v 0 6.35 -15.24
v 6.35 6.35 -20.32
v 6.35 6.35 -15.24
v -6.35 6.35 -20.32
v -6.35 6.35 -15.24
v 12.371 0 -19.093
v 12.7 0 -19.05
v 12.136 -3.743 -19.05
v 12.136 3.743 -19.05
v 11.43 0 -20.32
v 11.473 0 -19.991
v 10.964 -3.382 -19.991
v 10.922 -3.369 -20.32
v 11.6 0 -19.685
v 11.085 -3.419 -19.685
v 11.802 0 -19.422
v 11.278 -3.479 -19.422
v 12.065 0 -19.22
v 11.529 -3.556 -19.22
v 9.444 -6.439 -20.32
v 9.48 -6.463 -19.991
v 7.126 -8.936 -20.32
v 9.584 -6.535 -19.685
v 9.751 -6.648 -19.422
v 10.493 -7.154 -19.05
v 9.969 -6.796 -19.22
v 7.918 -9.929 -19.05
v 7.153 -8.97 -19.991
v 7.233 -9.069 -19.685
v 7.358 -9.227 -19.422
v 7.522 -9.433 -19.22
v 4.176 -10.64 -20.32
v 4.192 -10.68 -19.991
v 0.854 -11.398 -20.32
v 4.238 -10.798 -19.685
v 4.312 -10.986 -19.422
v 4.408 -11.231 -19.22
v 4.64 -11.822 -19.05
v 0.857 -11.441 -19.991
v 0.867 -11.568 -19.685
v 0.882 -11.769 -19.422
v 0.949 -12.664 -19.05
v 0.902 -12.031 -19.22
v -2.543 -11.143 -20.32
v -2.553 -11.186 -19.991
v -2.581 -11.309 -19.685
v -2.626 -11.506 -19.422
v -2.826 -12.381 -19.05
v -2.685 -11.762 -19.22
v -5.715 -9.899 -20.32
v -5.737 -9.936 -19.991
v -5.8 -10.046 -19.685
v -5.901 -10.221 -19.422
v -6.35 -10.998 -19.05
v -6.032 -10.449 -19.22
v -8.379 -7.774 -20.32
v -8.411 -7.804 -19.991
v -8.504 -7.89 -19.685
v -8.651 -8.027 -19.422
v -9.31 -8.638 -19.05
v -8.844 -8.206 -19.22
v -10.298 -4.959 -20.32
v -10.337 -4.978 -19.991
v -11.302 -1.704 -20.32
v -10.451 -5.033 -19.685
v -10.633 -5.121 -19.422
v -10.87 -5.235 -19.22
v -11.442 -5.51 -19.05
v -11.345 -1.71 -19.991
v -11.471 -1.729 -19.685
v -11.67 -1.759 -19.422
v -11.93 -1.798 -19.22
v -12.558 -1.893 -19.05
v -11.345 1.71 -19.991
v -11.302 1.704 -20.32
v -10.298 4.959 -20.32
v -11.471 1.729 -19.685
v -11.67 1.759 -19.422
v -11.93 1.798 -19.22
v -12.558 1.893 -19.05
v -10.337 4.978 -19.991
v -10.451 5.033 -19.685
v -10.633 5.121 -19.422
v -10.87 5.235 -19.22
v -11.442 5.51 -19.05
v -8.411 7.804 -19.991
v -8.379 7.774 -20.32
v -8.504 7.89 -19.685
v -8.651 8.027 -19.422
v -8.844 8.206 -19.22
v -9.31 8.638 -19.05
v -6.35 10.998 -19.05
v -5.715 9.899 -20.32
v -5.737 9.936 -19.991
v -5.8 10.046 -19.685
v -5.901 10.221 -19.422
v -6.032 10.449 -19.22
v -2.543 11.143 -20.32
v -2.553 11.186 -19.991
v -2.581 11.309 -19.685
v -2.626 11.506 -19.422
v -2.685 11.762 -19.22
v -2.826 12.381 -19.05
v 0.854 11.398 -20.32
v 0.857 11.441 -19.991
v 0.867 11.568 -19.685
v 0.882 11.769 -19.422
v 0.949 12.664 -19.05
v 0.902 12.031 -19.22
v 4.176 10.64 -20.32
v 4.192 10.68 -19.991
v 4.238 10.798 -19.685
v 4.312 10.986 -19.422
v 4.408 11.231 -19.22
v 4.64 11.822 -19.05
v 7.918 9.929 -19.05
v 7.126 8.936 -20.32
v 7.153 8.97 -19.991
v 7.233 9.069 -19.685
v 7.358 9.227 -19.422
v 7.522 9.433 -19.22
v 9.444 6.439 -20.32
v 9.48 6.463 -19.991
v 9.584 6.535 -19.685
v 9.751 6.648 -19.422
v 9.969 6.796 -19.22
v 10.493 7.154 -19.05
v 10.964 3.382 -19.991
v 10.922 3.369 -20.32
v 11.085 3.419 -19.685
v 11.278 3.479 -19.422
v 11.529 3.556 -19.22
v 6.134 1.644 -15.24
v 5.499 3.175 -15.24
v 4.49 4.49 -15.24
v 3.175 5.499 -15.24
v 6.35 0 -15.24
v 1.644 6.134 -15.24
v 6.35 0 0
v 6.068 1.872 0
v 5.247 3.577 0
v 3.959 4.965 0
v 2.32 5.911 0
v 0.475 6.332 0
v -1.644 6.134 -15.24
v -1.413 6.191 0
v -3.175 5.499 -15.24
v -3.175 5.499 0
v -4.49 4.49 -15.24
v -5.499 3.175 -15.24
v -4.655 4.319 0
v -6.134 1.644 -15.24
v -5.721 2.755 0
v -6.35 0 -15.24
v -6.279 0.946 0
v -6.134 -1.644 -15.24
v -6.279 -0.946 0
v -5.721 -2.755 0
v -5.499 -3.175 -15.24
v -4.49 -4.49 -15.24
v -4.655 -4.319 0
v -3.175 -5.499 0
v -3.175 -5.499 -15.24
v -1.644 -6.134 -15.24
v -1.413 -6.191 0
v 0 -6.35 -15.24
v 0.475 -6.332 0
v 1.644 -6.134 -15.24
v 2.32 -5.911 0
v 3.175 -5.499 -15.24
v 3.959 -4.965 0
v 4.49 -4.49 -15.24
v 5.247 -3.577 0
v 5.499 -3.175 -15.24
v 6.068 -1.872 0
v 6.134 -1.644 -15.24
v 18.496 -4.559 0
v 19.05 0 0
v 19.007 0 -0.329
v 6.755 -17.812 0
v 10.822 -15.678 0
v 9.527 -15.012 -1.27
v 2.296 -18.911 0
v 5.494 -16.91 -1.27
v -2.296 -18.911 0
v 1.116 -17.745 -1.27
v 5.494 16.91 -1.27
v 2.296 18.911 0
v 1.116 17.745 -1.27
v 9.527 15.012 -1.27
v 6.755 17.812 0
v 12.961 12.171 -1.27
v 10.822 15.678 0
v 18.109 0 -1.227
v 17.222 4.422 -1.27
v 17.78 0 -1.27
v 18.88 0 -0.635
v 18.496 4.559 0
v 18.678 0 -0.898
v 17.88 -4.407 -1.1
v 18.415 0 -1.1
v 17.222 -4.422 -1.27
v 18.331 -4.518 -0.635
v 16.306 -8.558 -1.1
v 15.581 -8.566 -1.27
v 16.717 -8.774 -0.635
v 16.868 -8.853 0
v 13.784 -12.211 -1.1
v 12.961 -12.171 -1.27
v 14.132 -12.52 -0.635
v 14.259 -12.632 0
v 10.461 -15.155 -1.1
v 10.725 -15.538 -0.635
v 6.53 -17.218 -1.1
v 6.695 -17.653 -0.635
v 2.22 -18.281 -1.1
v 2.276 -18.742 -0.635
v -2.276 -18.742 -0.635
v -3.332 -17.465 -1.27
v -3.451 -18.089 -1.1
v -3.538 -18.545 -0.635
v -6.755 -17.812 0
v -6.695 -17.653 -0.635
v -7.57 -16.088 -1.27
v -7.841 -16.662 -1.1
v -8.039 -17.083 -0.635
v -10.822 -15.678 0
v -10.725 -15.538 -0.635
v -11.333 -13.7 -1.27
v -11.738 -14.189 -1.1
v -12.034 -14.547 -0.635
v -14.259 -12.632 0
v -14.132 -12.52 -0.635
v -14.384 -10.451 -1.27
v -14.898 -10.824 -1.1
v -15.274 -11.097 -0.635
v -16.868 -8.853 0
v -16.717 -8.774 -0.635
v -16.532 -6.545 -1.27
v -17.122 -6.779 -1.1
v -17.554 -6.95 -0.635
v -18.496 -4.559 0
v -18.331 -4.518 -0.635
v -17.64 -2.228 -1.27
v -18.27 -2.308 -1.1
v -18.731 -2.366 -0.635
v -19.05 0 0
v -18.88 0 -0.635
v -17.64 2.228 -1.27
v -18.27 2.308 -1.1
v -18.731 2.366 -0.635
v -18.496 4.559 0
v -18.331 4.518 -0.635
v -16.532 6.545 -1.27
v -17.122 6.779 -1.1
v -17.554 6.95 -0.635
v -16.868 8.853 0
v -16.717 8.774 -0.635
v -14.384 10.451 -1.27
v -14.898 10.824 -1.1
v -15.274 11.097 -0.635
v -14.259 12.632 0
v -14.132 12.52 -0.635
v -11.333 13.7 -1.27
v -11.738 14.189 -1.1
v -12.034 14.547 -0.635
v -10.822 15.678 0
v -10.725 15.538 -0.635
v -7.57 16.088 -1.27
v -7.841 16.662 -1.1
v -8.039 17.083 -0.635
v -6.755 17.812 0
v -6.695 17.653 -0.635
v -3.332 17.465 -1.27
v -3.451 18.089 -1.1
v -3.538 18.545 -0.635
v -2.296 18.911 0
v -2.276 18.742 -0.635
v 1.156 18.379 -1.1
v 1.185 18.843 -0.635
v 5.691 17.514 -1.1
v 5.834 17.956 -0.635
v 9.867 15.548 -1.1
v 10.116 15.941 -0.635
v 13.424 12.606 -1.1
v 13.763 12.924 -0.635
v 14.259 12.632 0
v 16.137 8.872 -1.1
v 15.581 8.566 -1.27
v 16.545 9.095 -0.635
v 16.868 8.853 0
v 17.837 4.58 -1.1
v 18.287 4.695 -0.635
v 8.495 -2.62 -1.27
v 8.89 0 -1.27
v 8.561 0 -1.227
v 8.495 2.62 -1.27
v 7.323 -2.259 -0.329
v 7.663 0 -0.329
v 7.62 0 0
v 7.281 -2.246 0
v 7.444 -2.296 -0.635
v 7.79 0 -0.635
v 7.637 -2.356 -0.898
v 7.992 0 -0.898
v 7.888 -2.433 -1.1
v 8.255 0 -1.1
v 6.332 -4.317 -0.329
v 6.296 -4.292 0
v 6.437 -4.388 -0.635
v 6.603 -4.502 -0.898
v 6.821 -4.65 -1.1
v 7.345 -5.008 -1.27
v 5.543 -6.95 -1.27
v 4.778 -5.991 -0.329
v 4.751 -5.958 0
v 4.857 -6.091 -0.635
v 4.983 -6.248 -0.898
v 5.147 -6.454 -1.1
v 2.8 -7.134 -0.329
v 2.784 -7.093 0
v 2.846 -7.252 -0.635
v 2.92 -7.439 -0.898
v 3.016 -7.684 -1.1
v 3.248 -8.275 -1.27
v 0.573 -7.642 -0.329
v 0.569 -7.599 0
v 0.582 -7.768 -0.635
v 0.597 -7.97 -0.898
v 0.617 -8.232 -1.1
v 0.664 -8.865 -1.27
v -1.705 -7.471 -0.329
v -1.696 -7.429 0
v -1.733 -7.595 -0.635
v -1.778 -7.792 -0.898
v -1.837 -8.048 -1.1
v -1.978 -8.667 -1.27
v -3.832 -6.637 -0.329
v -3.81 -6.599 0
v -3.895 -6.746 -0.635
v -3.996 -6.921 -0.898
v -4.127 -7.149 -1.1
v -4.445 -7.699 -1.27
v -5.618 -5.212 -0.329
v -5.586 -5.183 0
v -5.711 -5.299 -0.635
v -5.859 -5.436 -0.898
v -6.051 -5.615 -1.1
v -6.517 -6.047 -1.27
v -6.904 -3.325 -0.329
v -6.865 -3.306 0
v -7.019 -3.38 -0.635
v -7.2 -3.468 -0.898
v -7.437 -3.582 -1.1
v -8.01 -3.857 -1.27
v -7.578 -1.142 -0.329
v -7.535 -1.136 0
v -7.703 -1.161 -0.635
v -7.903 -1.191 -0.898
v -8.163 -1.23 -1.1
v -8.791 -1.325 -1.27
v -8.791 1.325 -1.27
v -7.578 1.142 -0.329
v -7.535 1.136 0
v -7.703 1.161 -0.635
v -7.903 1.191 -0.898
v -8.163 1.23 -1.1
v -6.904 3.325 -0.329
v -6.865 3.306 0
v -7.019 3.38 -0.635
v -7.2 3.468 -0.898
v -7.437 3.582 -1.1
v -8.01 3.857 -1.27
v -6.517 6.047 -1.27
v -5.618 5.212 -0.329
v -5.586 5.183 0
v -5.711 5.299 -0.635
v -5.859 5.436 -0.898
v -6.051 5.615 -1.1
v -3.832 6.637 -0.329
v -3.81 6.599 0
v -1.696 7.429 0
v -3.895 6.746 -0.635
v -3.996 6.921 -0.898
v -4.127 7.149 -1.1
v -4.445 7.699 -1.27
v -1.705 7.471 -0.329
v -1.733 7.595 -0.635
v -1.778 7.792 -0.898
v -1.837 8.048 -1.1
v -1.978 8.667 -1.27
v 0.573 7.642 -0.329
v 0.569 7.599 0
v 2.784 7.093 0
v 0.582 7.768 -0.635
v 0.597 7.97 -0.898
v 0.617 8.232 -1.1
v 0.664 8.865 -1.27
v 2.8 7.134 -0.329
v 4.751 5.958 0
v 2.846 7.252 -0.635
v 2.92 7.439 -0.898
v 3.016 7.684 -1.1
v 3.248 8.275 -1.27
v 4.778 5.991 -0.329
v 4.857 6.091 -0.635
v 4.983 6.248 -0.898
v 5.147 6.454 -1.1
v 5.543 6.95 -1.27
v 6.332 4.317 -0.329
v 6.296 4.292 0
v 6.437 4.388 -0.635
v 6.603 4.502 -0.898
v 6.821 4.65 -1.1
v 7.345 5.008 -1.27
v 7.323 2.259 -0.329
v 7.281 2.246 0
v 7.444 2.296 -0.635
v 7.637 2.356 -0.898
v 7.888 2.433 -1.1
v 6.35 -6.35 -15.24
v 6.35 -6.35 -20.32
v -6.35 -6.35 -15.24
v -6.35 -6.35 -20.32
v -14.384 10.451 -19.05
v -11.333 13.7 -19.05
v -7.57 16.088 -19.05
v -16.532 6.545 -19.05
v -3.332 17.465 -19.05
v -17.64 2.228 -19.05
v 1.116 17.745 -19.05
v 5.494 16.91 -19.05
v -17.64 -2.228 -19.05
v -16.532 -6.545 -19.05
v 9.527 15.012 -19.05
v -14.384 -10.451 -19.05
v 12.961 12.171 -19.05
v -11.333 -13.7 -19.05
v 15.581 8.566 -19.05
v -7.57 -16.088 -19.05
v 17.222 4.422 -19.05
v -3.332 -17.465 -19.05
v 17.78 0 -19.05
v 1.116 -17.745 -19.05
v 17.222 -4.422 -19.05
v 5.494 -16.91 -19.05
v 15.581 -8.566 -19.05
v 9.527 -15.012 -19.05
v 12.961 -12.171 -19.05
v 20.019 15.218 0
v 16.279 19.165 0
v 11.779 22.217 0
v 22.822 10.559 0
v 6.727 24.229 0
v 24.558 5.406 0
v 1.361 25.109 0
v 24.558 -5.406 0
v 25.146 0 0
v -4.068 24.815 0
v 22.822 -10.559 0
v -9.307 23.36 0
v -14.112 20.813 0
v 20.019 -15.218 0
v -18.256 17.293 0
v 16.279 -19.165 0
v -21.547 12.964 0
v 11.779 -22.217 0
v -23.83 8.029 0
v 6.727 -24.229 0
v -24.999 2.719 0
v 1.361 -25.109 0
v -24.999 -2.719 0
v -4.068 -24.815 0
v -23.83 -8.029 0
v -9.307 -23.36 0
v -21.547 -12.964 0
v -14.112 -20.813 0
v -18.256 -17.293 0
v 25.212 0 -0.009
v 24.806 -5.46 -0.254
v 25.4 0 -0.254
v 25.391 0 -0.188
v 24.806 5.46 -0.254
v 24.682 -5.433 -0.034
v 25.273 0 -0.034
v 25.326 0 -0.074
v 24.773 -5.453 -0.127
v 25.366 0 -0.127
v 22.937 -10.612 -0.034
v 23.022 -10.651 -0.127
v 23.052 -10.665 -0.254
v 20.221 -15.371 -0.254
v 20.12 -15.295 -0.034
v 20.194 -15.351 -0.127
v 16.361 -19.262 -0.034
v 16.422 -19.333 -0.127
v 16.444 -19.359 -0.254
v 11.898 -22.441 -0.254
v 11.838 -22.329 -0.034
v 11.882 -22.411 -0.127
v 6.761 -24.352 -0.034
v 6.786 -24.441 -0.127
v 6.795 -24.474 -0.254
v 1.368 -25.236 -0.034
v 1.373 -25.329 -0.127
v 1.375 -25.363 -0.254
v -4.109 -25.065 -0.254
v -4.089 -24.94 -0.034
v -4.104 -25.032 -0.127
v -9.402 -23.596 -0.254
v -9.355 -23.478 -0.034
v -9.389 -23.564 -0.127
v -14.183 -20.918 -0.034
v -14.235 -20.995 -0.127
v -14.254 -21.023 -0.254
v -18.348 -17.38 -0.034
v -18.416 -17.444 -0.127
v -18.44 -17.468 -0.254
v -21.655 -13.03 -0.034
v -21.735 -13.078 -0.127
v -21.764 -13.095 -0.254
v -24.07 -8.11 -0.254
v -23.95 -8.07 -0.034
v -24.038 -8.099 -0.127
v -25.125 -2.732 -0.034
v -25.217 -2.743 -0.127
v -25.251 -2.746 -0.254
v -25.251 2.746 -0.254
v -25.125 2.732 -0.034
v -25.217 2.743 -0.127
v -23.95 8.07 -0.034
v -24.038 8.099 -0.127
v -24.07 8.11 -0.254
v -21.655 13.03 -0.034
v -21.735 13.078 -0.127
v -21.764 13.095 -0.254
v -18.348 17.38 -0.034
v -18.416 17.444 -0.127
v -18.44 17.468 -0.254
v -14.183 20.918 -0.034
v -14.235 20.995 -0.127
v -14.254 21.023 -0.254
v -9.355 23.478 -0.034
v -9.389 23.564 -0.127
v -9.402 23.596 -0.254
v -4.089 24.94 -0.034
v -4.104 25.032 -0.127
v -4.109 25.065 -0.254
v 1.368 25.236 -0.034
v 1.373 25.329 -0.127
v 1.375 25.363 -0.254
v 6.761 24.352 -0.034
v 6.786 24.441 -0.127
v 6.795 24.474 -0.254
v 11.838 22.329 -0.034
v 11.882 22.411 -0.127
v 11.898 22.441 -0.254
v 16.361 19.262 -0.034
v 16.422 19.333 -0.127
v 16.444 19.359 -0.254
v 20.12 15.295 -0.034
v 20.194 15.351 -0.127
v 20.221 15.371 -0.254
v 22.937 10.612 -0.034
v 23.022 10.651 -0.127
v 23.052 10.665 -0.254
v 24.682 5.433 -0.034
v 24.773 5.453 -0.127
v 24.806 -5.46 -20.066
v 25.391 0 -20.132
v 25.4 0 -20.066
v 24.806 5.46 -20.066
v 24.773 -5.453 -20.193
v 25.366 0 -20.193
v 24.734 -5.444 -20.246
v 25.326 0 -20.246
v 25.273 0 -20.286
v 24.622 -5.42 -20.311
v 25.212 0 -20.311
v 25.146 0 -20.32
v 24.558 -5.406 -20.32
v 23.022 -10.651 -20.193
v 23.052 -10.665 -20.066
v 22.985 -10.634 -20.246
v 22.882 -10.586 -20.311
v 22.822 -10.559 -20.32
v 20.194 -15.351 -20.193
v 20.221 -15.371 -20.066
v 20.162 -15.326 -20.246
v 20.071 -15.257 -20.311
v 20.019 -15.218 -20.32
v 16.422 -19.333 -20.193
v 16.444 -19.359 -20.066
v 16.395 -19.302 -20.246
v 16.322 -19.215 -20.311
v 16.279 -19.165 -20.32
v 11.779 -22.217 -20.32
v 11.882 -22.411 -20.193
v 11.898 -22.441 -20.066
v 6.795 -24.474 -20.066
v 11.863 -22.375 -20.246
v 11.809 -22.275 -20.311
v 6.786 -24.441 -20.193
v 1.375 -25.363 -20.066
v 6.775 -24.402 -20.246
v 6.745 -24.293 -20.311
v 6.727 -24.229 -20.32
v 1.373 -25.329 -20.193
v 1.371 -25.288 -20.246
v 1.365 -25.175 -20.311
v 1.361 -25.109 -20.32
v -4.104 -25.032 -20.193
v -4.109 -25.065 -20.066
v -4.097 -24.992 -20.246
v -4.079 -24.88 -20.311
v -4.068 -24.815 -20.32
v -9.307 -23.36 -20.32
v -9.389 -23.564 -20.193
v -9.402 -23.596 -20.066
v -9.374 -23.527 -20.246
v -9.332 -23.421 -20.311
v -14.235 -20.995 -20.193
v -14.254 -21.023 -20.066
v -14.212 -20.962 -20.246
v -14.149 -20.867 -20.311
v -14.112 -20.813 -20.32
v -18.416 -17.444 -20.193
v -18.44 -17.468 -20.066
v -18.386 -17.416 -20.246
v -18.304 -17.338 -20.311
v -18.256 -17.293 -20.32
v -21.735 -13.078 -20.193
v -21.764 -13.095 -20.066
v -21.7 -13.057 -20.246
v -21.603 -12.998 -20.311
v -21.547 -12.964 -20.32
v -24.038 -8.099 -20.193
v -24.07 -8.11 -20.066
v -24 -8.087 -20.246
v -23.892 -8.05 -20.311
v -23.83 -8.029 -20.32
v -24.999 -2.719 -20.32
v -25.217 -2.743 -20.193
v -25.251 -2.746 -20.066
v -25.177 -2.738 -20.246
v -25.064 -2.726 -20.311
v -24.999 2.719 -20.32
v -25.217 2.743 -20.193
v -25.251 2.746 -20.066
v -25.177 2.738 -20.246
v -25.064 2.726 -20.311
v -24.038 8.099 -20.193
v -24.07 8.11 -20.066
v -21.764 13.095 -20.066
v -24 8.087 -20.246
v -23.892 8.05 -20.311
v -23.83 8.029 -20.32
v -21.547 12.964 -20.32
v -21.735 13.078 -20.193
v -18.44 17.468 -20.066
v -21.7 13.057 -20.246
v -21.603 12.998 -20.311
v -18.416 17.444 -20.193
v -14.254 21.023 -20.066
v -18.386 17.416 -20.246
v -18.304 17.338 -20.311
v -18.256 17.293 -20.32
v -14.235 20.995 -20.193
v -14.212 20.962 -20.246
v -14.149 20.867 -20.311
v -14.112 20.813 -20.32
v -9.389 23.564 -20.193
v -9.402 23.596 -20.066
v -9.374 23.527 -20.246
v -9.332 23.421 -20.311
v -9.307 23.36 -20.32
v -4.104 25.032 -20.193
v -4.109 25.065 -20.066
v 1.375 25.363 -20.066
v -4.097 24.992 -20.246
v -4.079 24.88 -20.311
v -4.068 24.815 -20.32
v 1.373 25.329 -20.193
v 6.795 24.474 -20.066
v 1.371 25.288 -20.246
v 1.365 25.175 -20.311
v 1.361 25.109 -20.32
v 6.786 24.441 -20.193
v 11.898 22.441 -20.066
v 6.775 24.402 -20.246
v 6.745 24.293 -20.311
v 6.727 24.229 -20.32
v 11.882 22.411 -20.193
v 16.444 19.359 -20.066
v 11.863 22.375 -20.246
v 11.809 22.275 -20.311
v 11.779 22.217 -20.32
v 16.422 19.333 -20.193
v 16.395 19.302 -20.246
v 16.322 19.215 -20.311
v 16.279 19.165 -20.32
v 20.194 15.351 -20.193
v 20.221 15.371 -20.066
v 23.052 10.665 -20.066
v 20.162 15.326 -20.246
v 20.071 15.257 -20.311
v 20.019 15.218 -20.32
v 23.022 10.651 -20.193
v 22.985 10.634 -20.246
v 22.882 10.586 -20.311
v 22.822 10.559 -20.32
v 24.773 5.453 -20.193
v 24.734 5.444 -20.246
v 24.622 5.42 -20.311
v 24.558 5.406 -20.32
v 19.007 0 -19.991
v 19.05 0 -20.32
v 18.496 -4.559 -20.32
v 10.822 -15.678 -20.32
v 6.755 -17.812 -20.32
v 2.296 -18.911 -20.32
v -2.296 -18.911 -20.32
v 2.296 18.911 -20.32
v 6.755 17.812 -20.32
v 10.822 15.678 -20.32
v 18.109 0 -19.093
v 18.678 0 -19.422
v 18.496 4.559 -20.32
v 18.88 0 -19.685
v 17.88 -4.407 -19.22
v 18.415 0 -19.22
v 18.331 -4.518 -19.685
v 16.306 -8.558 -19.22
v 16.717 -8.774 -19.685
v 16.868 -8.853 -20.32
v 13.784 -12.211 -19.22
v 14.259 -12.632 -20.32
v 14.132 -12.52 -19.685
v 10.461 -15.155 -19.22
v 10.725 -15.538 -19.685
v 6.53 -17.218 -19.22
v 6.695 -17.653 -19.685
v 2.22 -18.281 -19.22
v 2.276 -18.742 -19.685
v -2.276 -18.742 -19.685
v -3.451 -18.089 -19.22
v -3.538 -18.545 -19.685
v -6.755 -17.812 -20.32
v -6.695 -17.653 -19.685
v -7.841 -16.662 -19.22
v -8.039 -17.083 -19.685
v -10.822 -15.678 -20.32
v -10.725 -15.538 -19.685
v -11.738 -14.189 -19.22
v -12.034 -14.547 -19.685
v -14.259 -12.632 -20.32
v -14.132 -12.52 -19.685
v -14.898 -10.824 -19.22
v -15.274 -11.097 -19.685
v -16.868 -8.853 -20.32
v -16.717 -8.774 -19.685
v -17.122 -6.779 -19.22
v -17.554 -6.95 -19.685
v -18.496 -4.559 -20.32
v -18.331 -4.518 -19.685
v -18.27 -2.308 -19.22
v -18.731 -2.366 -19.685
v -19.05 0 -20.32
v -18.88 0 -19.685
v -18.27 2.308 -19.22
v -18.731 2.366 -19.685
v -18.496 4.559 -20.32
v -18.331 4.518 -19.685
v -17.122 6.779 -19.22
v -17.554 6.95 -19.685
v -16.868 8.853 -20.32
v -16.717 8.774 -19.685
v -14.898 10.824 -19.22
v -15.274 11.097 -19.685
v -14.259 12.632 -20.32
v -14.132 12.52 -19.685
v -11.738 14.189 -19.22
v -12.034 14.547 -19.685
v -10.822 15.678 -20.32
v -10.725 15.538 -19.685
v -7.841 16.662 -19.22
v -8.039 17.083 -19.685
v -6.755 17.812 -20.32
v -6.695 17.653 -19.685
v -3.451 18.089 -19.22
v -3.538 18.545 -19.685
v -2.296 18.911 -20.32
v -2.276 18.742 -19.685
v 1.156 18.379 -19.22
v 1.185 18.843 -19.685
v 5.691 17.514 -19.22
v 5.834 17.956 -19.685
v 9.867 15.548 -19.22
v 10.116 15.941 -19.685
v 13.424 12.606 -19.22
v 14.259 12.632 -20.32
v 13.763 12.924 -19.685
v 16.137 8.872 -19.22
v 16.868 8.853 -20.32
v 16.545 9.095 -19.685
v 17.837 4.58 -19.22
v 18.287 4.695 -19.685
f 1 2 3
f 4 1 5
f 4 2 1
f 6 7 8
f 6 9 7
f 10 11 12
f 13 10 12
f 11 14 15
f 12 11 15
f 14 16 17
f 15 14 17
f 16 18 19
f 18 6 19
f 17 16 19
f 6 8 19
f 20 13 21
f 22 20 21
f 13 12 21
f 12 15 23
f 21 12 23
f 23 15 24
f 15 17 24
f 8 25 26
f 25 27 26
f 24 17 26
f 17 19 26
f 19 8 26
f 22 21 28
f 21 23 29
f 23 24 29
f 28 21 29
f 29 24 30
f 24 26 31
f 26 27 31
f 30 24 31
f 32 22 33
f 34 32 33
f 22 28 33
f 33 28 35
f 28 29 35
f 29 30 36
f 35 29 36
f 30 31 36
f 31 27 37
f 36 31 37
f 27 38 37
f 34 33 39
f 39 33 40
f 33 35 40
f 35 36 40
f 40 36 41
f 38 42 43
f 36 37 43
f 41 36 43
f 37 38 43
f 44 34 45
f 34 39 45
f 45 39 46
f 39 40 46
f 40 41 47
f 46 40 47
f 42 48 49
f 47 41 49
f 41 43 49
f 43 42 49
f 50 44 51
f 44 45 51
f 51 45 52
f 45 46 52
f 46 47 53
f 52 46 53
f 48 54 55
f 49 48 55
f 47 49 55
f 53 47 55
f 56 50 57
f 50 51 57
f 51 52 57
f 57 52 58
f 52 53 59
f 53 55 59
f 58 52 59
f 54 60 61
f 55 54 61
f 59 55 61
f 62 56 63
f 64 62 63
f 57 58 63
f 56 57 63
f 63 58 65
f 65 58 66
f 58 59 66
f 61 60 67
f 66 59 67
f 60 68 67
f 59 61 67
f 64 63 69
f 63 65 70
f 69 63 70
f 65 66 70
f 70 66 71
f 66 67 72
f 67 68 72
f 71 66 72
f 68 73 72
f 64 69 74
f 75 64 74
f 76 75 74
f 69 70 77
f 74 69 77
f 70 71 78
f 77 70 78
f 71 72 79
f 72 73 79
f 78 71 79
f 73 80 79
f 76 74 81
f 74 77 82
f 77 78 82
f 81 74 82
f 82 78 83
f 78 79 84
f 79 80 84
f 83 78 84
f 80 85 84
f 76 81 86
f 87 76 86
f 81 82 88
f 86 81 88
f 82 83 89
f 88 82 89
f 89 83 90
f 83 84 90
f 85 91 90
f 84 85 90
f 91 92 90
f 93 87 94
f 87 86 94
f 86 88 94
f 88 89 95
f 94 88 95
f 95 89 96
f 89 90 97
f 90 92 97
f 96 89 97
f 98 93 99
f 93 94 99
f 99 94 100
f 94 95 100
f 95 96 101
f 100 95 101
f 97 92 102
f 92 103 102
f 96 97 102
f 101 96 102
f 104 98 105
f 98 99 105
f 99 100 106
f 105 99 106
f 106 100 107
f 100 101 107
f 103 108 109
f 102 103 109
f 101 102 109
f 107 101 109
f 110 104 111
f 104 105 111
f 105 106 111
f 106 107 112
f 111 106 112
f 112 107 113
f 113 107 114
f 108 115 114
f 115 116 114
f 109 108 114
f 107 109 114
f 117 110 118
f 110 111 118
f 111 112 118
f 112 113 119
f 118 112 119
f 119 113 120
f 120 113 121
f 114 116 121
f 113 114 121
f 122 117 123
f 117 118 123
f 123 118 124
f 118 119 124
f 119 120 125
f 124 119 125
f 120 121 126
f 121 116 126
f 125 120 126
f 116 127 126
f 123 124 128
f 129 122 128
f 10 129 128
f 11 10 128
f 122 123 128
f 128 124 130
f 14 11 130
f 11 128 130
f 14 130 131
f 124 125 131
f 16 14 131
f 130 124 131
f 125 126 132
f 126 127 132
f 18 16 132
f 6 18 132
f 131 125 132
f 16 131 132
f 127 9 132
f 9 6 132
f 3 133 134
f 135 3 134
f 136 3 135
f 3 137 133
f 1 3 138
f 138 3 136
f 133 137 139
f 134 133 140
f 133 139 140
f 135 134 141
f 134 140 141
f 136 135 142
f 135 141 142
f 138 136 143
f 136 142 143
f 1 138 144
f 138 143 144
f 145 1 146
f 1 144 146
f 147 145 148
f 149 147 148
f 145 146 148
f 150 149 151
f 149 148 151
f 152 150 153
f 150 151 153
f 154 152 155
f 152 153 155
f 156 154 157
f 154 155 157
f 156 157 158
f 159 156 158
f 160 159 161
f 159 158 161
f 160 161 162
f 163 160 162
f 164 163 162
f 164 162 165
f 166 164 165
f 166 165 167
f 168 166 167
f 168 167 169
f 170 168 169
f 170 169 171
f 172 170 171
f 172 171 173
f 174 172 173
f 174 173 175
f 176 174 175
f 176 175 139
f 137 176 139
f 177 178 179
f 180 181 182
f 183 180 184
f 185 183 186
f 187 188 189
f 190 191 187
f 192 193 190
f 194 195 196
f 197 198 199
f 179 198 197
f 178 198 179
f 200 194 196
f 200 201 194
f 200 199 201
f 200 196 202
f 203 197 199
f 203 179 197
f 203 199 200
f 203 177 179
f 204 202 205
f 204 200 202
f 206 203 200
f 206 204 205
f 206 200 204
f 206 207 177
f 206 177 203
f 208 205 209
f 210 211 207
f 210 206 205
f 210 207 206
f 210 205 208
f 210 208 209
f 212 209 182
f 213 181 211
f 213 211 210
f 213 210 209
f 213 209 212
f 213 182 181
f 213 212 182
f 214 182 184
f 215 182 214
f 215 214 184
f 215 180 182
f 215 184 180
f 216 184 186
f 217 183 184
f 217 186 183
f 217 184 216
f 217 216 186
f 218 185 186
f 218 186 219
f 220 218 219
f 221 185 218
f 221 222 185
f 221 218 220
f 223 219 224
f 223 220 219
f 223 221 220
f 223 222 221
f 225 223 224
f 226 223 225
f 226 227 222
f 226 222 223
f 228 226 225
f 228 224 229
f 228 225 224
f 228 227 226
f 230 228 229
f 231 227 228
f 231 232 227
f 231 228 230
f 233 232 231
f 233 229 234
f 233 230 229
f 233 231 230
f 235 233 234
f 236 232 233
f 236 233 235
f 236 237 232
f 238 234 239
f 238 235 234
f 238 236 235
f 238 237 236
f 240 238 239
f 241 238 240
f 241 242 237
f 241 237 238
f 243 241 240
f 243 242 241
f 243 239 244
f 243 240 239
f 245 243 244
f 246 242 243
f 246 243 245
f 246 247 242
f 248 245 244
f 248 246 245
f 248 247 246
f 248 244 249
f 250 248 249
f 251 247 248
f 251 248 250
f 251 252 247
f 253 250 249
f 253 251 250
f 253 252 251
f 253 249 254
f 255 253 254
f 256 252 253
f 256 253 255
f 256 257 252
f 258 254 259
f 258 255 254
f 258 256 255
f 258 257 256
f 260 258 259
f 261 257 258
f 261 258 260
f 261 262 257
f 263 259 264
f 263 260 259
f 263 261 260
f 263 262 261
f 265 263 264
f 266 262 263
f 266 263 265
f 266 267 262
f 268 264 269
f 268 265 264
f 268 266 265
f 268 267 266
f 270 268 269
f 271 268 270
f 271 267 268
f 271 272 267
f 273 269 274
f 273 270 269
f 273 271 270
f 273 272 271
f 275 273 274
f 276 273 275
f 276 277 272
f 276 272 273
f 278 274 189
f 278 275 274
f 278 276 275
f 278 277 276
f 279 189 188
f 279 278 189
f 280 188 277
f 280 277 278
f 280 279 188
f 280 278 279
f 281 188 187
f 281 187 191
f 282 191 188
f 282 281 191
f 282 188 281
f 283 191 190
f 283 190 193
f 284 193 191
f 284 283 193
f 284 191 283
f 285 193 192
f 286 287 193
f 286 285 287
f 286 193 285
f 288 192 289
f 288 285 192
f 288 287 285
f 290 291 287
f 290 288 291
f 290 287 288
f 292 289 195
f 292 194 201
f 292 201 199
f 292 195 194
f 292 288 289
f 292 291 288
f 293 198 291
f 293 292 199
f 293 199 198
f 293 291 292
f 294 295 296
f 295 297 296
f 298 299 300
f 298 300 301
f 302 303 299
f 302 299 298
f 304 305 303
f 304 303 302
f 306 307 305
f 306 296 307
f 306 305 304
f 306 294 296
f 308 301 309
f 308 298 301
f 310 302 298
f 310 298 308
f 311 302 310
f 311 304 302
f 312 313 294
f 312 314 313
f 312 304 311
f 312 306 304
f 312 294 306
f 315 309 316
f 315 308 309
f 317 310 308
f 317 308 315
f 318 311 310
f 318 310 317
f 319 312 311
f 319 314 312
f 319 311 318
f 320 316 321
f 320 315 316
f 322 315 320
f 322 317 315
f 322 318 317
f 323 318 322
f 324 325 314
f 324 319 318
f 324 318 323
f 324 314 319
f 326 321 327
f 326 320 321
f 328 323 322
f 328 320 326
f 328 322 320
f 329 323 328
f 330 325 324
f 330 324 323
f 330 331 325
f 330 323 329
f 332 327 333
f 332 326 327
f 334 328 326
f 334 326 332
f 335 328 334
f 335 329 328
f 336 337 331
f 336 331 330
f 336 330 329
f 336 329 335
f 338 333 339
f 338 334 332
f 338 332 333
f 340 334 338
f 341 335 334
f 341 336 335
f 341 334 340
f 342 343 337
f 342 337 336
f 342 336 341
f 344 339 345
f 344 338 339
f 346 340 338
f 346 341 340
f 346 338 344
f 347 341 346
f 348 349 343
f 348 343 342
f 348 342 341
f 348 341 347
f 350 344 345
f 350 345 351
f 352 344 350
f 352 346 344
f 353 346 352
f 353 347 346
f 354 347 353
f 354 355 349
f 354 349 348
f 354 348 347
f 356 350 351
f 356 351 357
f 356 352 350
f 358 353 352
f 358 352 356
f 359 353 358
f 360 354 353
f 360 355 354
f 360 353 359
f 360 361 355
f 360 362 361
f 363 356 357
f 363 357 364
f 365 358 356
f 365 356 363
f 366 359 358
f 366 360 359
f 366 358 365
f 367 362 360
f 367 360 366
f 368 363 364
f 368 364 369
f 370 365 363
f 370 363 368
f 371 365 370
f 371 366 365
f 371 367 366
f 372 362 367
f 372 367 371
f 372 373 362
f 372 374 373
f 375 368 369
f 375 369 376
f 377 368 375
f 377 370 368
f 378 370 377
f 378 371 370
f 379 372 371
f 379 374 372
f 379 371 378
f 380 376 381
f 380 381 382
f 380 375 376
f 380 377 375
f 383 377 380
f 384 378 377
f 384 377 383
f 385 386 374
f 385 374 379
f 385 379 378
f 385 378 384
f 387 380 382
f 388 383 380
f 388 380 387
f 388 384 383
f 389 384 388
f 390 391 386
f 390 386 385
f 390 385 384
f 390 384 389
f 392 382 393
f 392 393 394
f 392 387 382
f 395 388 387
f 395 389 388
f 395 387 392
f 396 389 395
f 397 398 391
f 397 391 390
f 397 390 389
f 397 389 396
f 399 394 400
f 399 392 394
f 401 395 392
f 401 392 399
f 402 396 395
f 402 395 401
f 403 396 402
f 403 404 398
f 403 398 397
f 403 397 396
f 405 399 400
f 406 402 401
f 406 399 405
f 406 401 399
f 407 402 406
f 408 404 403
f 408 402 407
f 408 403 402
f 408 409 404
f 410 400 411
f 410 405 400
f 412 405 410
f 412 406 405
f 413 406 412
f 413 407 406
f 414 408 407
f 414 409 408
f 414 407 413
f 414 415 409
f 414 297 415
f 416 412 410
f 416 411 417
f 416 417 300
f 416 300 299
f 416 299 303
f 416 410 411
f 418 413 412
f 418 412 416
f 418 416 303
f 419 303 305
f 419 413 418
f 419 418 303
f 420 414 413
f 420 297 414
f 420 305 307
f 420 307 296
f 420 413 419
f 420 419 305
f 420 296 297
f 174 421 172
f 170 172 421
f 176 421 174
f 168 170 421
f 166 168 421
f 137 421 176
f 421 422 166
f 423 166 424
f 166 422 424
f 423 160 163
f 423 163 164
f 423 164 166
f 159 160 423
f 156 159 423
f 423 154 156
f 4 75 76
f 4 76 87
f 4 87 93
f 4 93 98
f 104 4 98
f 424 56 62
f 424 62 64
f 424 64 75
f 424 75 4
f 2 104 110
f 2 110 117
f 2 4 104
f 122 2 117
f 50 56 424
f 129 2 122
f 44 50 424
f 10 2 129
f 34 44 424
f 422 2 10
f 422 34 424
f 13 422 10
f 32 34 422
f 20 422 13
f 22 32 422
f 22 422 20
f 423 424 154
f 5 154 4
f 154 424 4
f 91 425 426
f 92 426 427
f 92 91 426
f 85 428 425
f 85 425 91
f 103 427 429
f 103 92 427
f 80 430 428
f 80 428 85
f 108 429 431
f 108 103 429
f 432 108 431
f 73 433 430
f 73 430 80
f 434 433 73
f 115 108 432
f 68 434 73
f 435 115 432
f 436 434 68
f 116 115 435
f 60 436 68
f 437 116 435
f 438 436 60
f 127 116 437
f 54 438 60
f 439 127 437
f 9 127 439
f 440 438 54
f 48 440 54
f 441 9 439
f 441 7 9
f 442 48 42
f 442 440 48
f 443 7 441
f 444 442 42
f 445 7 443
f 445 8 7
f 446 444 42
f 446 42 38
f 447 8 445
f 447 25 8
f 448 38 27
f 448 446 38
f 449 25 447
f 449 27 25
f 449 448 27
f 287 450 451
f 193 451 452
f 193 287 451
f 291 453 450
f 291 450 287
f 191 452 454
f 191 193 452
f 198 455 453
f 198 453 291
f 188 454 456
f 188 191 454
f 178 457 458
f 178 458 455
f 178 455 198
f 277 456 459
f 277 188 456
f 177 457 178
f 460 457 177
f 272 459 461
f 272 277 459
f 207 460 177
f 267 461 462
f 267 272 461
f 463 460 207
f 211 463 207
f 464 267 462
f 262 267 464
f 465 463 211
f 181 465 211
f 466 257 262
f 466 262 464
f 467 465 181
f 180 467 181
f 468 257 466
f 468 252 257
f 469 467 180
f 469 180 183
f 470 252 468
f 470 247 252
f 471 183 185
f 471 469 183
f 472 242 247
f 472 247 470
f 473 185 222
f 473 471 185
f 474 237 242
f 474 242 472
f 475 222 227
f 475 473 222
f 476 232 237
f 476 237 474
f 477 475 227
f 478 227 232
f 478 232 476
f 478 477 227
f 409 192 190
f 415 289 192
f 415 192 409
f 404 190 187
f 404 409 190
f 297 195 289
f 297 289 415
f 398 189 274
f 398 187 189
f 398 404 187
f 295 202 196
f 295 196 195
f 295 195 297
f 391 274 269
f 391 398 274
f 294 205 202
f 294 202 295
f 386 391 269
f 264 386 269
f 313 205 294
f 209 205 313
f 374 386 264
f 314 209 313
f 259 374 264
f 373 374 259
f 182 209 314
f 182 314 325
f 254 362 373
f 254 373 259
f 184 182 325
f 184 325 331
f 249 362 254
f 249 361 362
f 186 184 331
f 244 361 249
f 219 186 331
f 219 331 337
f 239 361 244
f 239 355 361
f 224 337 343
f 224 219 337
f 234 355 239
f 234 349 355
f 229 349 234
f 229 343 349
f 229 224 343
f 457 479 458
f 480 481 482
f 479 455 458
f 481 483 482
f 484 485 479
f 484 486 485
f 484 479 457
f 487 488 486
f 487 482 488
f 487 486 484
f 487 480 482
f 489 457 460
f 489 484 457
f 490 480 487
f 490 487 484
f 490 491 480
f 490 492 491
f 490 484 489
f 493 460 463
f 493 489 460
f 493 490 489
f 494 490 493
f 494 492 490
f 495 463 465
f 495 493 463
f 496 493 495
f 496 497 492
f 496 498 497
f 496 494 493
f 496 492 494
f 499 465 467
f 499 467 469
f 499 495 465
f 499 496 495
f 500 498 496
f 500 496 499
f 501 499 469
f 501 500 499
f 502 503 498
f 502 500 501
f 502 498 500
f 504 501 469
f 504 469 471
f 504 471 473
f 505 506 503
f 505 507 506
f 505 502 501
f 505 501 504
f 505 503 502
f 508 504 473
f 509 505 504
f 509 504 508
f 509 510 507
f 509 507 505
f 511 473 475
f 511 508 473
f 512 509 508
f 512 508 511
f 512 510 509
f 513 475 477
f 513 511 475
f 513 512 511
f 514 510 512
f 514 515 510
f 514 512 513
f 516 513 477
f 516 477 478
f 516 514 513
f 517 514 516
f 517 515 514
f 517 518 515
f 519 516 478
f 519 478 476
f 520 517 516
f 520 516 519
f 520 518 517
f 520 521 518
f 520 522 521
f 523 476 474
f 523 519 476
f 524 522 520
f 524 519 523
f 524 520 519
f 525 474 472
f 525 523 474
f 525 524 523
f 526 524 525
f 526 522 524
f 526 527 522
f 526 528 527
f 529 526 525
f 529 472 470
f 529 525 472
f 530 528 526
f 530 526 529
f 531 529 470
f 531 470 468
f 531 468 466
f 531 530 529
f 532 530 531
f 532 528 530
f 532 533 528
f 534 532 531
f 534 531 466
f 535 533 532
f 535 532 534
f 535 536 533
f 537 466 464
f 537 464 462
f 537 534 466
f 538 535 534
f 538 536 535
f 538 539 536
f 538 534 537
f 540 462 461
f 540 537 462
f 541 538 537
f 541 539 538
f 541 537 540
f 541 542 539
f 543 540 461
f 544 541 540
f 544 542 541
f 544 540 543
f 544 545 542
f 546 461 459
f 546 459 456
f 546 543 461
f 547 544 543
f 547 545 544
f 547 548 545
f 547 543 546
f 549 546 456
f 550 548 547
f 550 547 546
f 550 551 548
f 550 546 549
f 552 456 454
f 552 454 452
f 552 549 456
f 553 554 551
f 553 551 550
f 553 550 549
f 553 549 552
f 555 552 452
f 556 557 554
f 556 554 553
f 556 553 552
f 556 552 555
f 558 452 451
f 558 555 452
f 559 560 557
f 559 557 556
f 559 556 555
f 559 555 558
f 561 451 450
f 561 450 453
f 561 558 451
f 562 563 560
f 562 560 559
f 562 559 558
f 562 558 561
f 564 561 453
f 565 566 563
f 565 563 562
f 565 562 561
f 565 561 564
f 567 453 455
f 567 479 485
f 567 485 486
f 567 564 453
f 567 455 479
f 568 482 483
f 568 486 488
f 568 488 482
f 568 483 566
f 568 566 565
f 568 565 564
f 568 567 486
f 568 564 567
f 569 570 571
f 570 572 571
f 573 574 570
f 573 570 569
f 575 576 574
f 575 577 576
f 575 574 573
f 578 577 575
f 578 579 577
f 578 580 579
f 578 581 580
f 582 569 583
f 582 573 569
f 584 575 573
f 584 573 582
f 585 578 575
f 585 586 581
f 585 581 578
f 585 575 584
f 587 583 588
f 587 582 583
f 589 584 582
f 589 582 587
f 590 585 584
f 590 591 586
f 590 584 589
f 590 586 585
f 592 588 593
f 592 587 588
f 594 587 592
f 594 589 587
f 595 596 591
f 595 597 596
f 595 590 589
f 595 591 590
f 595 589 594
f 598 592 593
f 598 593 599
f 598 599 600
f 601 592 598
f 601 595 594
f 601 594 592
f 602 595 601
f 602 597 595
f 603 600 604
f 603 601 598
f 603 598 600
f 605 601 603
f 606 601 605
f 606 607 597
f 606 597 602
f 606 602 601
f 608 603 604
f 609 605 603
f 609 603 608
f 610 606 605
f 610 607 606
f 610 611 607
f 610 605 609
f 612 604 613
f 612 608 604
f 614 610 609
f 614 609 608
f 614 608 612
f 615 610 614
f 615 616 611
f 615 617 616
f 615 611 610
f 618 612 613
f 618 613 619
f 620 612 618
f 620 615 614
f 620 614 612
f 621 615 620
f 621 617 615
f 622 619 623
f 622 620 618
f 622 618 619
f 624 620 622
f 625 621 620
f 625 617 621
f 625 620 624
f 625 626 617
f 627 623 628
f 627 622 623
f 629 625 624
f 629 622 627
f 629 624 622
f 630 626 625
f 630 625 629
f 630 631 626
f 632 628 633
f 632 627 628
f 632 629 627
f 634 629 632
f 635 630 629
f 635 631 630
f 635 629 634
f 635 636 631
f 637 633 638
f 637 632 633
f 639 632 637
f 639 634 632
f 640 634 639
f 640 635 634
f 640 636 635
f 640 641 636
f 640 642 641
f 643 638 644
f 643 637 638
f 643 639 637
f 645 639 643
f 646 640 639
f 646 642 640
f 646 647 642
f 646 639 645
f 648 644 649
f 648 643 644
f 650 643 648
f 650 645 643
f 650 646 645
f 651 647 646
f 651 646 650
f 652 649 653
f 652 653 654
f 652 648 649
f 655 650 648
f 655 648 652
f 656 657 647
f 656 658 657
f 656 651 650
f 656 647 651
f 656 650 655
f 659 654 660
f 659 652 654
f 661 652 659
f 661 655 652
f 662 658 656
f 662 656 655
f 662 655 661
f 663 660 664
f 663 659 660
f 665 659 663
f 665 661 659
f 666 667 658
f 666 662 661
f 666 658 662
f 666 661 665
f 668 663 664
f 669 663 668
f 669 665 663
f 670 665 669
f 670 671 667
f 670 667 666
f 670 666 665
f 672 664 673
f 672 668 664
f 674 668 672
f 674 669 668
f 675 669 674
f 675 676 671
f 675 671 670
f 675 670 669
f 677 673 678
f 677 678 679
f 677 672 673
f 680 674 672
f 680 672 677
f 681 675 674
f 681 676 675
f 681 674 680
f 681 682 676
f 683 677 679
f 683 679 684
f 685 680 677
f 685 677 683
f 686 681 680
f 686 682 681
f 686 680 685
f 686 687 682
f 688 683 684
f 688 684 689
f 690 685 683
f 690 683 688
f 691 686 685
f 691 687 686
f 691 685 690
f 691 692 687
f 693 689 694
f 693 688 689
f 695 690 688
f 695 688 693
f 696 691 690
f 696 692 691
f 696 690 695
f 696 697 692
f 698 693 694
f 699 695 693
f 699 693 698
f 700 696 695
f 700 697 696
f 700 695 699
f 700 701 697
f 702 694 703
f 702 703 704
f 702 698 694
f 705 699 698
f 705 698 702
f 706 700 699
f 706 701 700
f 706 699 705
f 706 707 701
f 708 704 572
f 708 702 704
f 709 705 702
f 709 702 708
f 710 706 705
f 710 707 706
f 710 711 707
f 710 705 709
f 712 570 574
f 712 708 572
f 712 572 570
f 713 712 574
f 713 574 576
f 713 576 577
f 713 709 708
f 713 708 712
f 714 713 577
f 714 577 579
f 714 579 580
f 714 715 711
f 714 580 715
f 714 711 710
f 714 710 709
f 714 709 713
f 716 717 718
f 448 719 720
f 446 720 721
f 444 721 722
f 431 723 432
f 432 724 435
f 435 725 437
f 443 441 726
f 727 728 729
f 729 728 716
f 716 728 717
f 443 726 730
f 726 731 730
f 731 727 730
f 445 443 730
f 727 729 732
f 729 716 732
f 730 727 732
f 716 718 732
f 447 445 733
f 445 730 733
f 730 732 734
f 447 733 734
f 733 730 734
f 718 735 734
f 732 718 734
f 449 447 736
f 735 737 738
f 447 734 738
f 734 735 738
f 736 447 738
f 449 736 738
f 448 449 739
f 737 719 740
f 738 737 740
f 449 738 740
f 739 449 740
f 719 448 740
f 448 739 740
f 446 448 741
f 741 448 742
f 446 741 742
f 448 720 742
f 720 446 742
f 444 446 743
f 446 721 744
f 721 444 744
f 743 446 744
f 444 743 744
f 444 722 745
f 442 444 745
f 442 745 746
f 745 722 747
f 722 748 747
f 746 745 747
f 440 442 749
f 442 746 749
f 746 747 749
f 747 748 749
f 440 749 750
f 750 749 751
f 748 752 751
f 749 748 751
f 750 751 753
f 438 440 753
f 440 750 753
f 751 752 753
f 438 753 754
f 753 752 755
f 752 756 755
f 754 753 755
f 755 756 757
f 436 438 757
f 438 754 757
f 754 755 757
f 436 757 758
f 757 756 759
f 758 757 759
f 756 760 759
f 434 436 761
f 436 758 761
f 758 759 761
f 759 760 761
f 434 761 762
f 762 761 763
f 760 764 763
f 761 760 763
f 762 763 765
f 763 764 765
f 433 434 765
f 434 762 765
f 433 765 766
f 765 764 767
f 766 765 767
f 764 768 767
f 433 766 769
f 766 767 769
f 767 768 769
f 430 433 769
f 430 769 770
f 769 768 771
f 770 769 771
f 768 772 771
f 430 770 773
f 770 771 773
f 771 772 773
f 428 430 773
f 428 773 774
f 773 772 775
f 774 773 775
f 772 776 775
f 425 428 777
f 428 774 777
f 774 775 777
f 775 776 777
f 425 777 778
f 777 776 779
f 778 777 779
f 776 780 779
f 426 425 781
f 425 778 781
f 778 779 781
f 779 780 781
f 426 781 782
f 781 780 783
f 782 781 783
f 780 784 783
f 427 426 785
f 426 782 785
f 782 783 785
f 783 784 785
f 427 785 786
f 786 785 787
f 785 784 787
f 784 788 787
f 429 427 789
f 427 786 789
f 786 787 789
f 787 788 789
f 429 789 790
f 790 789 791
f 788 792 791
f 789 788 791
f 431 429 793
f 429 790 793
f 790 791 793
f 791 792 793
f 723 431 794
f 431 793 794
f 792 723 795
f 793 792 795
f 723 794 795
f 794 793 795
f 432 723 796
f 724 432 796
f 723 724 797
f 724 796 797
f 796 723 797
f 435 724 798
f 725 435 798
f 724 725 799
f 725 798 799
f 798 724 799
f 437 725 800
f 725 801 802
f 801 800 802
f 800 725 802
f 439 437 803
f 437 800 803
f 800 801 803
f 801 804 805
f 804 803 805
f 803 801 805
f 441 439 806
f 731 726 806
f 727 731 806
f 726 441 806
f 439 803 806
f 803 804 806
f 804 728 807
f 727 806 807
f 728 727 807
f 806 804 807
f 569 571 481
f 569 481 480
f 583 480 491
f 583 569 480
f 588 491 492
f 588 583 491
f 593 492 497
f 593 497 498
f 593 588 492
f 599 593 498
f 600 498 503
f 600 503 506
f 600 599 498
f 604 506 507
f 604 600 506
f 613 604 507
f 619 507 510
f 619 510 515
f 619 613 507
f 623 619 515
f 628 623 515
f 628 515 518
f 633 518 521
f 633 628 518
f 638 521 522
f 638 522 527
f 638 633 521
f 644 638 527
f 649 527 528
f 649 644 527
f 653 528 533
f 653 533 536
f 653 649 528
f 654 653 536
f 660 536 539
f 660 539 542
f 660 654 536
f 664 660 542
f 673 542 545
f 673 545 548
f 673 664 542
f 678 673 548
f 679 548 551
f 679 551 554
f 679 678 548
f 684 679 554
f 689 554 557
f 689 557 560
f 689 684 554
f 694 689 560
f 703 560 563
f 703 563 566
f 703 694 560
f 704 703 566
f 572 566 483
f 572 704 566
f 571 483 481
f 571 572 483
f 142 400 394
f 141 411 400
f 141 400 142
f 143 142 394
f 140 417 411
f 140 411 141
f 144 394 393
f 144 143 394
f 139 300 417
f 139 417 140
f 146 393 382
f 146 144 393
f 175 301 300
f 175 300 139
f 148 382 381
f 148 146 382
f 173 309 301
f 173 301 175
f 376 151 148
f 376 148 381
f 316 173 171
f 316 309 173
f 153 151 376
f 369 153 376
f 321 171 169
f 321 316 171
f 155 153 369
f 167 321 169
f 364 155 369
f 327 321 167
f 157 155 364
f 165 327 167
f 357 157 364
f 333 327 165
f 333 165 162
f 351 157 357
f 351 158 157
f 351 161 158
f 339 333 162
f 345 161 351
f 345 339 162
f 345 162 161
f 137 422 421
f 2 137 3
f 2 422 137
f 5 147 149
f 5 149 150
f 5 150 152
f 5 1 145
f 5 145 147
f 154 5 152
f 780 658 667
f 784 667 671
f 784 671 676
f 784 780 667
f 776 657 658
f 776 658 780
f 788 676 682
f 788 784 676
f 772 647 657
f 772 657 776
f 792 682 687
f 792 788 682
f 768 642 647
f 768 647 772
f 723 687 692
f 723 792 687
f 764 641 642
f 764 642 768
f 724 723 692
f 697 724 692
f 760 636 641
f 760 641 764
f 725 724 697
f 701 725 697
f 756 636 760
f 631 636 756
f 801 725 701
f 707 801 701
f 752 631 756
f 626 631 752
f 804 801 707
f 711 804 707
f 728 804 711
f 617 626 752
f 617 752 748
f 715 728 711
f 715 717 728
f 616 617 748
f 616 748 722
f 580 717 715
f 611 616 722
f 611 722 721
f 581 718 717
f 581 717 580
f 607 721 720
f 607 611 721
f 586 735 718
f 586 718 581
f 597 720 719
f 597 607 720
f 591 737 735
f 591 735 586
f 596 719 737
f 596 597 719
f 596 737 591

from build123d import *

# Parameters (mm, degrees)
SKETCH3_R          = 6.35
CUT_EXTRUDE1_DEPTH = 42.270115096
FILLET1_R          = 1.27
FILLET2_R          = 0.254
SKETCH4_W          = 12.7
SKETCH4_H          = 12.7
CUT_EXTRUDE2_DEPTH = 5.08


with BuildPart() as part:
    # Sketch2 → Revolve1 (revolve)
    with BuildSketch(Plane(origin=(0, 0, 0), x_dir=(0, 0, -1), z_dir=(1, 0, 0)), mode=Mode.PRIVATE) as revolve1_sk:
        Polygon((0, -7.62), (1.27, -7.62), (1.27, -19.05), (0, -19.05), (0, -25.4), (20.32, -25.4), (20.32, -19.05), (19.05, -19.05), (19.05, -11.43), (20.32, -11.43), (20.32, 0), (0, 0), align=None)
    revolve(revolve1_sk.sketch.rotate(Axis((0, 0, 0), (0, 0, -1)), 270), axis=Axis((0, 0, 0), (0, 0, -1)))

    # Sketch3 → Cut-Extrude1 (cut, through all)
    with BuildSketch(Plane.XY):
        Circle(SKETCH3_R)
    extrude(amount=-CUT_EXTRUDE1_DEPTH, mode=Mode.SUBTRACT)

    # Fillet1
    fillet1_edges = [part.edges().sort_by_distance(p)[0] for p in [
        (-19.05, 0, -19.05),
        (-19.05, 0, -1.27),
        (-7.62, 0, -1.27),
        (-11.43, 0, -19.05),
    ]]
    fillet(fillet1_edges, radius=FILLET1_R - 0.0001)  # a hair under: the kernel refuses the full size

    # Fillet2
    fillet2_edges = [part.edges().sort_by_distance(p)[0] for p in [
        (-25.4, 0, -20.32),
        (-25.4, 0, 0),
    ]]
    fillet(fillet2_edges, radius=FILLET2_R)

    # Sketch4 → Cut-Extrude2 (cut)
    with BuildSketch(Plane(origin=(0, 0, -20.32), x_dir=(-1, 0, 0), z_dir=(0, 0, -1))):
        Rectangle(SKETCH4_W, SKETCH4_H)
    extrude(amount=-CUT_EXTRUDE2_DEPTH, mode=Mode.SUBTRACT)


solid = part.part
